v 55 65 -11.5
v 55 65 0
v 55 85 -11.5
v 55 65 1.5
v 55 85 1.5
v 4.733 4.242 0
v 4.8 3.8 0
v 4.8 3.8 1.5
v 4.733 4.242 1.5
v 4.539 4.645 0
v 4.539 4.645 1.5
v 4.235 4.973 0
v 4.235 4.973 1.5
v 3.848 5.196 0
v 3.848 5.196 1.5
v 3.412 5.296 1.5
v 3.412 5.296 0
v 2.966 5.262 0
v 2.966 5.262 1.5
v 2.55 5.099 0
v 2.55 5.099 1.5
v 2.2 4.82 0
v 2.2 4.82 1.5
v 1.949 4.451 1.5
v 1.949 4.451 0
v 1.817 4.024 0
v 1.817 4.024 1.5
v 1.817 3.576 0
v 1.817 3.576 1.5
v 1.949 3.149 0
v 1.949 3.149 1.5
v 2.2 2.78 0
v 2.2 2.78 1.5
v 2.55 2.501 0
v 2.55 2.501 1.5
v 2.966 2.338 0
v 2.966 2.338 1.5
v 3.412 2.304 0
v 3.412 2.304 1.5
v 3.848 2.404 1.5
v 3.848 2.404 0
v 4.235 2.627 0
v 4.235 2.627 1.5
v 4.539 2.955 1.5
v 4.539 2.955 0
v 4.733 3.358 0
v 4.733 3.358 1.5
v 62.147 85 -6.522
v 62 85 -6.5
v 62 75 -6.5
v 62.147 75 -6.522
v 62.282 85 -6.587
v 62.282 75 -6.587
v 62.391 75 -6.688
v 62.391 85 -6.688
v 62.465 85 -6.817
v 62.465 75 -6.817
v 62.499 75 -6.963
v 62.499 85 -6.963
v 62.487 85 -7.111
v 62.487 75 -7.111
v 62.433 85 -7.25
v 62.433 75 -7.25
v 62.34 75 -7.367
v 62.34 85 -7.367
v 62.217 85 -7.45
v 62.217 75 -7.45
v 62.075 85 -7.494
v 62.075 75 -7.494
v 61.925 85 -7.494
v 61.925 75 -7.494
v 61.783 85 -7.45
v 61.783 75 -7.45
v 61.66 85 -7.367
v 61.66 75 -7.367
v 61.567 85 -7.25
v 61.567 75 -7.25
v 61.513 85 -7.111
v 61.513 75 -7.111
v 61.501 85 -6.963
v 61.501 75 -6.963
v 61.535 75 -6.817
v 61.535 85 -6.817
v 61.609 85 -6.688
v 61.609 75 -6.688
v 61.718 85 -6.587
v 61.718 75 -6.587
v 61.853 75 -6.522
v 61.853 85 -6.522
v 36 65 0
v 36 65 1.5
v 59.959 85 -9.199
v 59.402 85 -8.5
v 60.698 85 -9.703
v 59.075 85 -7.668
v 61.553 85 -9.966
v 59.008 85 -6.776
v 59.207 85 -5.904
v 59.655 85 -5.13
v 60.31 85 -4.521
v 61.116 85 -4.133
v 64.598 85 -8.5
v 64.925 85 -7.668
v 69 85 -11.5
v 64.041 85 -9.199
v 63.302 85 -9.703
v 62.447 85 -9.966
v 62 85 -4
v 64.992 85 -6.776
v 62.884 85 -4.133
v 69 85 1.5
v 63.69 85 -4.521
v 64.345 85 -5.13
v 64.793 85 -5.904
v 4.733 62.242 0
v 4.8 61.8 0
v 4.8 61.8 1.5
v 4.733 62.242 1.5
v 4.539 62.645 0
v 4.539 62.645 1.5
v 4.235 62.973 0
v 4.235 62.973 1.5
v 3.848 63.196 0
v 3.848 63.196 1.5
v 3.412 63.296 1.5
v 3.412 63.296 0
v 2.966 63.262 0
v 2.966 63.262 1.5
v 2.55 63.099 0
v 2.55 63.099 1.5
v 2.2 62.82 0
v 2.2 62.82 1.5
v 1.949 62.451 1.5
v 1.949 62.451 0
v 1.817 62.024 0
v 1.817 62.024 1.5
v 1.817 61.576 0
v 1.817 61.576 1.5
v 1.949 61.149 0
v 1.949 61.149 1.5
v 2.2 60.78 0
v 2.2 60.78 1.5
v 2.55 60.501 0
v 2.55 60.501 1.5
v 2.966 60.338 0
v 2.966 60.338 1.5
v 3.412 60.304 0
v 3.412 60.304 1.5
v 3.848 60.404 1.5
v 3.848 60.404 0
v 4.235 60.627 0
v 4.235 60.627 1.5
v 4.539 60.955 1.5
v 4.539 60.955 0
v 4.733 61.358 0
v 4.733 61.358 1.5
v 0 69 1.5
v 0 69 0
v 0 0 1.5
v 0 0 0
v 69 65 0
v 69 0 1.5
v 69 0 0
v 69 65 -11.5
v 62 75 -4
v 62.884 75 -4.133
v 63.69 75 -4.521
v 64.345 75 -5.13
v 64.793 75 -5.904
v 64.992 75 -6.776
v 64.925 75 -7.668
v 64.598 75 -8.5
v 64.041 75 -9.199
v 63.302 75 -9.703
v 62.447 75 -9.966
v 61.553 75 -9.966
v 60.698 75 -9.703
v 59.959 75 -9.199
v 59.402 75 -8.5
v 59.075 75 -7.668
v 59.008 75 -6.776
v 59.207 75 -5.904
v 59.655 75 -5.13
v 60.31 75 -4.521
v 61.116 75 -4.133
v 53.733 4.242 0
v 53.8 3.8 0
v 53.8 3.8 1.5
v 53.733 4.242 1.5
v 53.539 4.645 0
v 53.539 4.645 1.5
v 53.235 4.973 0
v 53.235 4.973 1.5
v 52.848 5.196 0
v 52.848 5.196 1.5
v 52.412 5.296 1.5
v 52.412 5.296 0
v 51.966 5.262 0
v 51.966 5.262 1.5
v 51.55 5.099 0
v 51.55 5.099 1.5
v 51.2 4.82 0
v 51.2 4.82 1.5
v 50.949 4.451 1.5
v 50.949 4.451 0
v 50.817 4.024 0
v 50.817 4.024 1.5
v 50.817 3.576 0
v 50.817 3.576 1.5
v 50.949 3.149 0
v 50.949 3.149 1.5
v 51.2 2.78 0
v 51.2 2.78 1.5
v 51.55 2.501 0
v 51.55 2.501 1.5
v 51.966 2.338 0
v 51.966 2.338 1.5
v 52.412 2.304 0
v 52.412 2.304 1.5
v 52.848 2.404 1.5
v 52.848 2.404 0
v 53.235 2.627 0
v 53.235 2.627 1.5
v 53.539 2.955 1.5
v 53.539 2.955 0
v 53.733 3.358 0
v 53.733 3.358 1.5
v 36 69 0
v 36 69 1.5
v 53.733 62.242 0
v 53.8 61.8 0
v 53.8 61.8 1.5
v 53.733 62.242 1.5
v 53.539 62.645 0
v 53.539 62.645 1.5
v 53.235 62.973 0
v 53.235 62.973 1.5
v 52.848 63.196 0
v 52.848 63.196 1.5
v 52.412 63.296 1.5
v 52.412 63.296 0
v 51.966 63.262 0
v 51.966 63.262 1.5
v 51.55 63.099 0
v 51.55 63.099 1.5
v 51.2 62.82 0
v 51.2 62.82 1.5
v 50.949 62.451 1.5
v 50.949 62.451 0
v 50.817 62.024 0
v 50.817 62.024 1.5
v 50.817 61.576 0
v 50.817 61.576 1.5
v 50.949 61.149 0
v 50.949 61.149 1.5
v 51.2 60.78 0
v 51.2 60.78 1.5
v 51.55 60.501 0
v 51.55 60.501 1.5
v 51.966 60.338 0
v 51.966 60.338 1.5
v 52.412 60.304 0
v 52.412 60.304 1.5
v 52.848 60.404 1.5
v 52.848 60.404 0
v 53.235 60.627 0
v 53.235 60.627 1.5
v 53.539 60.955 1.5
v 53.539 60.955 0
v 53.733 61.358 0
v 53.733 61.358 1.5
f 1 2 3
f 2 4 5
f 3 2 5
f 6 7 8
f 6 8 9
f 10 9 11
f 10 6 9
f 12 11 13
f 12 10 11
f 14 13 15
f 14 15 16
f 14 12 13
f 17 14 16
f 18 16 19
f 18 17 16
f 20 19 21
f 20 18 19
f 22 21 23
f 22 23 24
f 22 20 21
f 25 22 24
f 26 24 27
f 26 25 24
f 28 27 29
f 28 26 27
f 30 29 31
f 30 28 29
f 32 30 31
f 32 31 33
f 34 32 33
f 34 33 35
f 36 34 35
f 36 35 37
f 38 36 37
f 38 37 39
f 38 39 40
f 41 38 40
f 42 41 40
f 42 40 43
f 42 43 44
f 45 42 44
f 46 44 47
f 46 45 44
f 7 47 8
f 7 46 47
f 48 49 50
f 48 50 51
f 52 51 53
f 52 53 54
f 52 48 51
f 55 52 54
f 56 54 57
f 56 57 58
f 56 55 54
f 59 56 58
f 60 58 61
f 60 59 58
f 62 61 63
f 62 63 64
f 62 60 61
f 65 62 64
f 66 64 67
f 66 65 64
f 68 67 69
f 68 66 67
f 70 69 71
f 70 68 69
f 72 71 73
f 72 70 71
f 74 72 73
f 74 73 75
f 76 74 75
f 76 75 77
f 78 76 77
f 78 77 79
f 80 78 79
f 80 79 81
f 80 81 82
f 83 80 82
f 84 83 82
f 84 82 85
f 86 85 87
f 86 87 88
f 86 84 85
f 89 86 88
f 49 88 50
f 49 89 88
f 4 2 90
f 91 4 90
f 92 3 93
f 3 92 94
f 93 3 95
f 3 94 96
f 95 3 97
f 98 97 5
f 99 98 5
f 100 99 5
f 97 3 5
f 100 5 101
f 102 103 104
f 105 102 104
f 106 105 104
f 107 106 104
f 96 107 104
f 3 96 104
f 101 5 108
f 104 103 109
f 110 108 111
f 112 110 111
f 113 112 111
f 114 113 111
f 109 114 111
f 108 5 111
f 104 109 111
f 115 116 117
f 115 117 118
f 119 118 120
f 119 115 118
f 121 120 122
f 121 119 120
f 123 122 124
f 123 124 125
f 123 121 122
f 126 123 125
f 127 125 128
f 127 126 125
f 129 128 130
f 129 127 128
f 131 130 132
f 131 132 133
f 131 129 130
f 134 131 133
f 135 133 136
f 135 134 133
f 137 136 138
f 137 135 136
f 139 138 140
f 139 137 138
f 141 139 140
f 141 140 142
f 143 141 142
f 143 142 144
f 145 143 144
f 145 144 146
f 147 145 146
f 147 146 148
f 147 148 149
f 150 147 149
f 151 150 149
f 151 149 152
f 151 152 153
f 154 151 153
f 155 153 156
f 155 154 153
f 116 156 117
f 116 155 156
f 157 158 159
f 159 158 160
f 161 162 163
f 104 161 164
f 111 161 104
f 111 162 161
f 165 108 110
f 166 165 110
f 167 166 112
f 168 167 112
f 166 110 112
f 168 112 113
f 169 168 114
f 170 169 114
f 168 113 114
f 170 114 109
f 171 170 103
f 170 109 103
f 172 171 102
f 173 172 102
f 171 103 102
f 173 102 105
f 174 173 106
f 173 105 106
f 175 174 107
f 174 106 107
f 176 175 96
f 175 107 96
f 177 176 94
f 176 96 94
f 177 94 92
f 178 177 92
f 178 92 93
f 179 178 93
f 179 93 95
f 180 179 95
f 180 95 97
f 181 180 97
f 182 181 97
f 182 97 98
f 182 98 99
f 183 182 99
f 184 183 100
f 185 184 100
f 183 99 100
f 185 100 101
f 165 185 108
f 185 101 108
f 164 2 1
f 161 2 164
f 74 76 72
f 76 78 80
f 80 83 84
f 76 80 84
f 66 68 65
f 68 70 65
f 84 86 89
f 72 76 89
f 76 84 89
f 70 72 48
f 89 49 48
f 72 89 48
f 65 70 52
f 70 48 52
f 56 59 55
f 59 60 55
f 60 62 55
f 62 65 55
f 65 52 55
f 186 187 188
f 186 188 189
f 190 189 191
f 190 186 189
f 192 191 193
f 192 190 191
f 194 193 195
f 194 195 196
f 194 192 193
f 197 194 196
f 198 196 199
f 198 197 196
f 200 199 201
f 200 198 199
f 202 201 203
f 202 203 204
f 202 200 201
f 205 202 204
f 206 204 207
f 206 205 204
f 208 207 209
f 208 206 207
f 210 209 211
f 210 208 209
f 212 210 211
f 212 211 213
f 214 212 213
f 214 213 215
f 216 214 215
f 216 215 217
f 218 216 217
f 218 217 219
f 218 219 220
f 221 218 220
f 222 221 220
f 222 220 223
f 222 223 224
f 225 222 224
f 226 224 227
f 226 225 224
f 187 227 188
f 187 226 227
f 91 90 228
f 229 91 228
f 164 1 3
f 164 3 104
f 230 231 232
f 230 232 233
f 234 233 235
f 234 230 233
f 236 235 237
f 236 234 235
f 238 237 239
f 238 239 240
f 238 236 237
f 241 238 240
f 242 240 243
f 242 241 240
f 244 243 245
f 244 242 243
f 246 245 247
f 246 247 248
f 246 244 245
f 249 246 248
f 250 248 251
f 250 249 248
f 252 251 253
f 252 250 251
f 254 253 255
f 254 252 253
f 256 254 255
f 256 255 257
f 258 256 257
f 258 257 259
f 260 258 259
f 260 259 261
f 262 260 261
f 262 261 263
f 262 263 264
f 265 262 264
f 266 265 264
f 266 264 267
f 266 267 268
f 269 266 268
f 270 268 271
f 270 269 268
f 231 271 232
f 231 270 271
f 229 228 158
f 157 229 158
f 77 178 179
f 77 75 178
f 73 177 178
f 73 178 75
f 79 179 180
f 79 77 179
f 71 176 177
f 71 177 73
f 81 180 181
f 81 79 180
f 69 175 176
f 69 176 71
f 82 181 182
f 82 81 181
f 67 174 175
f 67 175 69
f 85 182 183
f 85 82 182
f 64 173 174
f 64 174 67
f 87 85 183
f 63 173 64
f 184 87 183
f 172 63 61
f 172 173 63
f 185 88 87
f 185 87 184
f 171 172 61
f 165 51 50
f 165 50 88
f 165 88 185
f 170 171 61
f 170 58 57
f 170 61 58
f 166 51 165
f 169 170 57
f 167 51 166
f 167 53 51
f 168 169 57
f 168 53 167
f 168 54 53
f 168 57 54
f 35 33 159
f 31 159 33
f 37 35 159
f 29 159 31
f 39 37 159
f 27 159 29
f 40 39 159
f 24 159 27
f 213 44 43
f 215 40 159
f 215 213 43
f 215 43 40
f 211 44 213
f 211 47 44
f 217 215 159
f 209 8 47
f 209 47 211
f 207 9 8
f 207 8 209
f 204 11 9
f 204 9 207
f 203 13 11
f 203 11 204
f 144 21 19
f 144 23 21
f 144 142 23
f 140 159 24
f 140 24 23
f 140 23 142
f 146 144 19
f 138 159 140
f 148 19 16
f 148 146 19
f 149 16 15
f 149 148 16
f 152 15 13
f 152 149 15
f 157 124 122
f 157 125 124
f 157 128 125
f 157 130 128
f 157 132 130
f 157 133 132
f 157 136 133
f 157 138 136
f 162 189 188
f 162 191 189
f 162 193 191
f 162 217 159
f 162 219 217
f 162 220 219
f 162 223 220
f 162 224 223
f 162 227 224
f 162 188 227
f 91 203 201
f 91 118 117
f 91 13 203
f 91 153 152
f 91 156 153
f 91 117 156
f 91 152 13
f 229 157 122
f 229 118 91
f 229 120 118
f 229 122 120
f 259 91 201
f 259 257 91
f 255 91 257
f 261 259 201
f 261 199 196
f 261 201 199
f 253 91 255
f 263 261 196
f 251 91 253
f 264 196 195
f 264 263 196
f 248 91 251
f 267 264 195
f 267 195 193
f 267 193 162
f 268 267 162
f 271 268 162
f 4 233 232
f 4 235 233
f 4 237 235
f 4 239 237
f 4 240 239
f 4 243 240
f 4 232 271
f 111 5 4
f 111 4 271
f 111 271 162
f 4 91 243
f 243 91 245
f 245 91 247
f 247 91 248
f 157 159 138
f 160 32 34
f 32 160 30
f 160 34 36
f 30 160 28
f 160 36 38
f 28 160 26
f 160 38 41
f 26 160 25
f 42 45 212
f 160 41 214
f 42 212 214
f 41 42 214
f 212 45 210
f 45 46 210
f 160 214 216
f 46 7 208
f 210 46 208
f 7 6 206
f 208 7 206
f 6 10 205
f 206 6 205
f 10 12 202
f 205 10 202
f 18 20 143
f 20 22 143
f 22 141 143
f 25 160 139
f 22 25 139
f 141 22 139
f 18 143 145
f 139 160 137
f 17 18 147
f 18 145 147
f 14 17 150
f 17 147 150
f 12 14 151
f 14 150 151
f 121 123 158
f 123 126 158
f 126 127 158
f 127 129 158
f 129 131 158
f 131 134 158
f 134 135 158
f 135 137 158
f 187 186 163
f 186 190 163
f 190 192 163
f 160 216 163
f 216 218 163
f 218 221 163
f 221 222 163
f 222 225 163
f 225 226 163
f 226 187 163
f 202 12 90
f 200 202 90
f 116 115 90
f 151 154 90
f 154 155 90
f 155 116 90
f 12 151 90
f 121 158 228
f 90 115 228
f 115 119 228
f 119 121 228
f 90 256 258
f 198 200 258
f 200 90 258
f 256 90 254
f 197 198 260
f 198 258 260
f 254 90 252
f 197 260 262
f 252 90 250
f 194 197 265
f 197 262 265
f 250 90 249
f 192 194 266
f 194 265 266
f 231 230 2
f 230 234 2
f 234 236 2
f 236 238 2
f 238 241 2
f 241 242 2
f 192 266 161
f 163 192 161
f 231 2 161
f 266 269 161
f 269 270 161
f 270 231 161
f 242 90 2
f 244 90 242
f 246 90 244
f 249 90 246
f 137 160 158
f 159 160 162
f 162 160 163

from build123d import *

# Parameters (mm, degrees)
SKETCH1_R           = 1.5
BOSS_EXTRUDE1_DEPTH = 1.5
SKETCH1_3_W         = 14
SKETCH1_3_H         = 20
BOSS_EXTRUDE2_DEPTH = 11.5
SKETCH2_R           = 3
SKETCH2_R_2         = 0.5
CUT_EXTRUDE1_DEPTH  = 10


with BuildPart() as part:
    # Sketch1 → Boss-Extrude1 (new body)
    with BuildSketch(Plane.XY):
        Polygon((55, 85), (55, 65), (36, 65), (36, 69), (0, 69), (0, 0), (69, 0), (69, 85), align=None)
        with Locations((52.3, 61.8)):
            Circle(SKETCH1_R, mode=Mode.SUBTRACT)
        with Locations((3.3, 3.8)):
            Circle(SKETCH1_R, mode=Mode.SUBTRACT)
        with Locations((52.3, 3.8)):
            Circle(SKETCH1_R, mode=Mode.SUBTRACT)
        with Locations((3.3, 61.8)):
            Circle(SKETCH1_R, mode=Mode.SUBTRACT)
    extrude(amount=BOSS_EXTRUDE1_DEPTH)

    # Sketch1_3 → Boss-Extrude2 (add)
    with BuildSketch(Plane.XY):
        with Locations((62, 75)):
            Rectangle(SKETCH1_3_W, SKETCH1_3_H)
    extrude(amount=-BOSS_EXTRUDE2_DEPTH)

    # Sketch2 → Cut-Extrude1 (cut)
    with BuildSketch(Plane(origin=(0, 85, 0), x_dir=(1, 0, 0), z_dir=(0, 1, 0))):
        with Locations(Location((62, 7, 0), (0, 0, 270))):  # turned: the seam where the file's is
            Circle(SKETCH2_R)
        with Locations(Location((62, 7, 0), (0, 0, 270))):  # turned: the seam where the file's is
            Circle(SKETCH2_R_2, mode=Mode.SUBTRACT)
    extrude(amount=-CUT_EXTRUDE1_DEPTH, mode=Mode.SUBTRACT)


solid = part.part
